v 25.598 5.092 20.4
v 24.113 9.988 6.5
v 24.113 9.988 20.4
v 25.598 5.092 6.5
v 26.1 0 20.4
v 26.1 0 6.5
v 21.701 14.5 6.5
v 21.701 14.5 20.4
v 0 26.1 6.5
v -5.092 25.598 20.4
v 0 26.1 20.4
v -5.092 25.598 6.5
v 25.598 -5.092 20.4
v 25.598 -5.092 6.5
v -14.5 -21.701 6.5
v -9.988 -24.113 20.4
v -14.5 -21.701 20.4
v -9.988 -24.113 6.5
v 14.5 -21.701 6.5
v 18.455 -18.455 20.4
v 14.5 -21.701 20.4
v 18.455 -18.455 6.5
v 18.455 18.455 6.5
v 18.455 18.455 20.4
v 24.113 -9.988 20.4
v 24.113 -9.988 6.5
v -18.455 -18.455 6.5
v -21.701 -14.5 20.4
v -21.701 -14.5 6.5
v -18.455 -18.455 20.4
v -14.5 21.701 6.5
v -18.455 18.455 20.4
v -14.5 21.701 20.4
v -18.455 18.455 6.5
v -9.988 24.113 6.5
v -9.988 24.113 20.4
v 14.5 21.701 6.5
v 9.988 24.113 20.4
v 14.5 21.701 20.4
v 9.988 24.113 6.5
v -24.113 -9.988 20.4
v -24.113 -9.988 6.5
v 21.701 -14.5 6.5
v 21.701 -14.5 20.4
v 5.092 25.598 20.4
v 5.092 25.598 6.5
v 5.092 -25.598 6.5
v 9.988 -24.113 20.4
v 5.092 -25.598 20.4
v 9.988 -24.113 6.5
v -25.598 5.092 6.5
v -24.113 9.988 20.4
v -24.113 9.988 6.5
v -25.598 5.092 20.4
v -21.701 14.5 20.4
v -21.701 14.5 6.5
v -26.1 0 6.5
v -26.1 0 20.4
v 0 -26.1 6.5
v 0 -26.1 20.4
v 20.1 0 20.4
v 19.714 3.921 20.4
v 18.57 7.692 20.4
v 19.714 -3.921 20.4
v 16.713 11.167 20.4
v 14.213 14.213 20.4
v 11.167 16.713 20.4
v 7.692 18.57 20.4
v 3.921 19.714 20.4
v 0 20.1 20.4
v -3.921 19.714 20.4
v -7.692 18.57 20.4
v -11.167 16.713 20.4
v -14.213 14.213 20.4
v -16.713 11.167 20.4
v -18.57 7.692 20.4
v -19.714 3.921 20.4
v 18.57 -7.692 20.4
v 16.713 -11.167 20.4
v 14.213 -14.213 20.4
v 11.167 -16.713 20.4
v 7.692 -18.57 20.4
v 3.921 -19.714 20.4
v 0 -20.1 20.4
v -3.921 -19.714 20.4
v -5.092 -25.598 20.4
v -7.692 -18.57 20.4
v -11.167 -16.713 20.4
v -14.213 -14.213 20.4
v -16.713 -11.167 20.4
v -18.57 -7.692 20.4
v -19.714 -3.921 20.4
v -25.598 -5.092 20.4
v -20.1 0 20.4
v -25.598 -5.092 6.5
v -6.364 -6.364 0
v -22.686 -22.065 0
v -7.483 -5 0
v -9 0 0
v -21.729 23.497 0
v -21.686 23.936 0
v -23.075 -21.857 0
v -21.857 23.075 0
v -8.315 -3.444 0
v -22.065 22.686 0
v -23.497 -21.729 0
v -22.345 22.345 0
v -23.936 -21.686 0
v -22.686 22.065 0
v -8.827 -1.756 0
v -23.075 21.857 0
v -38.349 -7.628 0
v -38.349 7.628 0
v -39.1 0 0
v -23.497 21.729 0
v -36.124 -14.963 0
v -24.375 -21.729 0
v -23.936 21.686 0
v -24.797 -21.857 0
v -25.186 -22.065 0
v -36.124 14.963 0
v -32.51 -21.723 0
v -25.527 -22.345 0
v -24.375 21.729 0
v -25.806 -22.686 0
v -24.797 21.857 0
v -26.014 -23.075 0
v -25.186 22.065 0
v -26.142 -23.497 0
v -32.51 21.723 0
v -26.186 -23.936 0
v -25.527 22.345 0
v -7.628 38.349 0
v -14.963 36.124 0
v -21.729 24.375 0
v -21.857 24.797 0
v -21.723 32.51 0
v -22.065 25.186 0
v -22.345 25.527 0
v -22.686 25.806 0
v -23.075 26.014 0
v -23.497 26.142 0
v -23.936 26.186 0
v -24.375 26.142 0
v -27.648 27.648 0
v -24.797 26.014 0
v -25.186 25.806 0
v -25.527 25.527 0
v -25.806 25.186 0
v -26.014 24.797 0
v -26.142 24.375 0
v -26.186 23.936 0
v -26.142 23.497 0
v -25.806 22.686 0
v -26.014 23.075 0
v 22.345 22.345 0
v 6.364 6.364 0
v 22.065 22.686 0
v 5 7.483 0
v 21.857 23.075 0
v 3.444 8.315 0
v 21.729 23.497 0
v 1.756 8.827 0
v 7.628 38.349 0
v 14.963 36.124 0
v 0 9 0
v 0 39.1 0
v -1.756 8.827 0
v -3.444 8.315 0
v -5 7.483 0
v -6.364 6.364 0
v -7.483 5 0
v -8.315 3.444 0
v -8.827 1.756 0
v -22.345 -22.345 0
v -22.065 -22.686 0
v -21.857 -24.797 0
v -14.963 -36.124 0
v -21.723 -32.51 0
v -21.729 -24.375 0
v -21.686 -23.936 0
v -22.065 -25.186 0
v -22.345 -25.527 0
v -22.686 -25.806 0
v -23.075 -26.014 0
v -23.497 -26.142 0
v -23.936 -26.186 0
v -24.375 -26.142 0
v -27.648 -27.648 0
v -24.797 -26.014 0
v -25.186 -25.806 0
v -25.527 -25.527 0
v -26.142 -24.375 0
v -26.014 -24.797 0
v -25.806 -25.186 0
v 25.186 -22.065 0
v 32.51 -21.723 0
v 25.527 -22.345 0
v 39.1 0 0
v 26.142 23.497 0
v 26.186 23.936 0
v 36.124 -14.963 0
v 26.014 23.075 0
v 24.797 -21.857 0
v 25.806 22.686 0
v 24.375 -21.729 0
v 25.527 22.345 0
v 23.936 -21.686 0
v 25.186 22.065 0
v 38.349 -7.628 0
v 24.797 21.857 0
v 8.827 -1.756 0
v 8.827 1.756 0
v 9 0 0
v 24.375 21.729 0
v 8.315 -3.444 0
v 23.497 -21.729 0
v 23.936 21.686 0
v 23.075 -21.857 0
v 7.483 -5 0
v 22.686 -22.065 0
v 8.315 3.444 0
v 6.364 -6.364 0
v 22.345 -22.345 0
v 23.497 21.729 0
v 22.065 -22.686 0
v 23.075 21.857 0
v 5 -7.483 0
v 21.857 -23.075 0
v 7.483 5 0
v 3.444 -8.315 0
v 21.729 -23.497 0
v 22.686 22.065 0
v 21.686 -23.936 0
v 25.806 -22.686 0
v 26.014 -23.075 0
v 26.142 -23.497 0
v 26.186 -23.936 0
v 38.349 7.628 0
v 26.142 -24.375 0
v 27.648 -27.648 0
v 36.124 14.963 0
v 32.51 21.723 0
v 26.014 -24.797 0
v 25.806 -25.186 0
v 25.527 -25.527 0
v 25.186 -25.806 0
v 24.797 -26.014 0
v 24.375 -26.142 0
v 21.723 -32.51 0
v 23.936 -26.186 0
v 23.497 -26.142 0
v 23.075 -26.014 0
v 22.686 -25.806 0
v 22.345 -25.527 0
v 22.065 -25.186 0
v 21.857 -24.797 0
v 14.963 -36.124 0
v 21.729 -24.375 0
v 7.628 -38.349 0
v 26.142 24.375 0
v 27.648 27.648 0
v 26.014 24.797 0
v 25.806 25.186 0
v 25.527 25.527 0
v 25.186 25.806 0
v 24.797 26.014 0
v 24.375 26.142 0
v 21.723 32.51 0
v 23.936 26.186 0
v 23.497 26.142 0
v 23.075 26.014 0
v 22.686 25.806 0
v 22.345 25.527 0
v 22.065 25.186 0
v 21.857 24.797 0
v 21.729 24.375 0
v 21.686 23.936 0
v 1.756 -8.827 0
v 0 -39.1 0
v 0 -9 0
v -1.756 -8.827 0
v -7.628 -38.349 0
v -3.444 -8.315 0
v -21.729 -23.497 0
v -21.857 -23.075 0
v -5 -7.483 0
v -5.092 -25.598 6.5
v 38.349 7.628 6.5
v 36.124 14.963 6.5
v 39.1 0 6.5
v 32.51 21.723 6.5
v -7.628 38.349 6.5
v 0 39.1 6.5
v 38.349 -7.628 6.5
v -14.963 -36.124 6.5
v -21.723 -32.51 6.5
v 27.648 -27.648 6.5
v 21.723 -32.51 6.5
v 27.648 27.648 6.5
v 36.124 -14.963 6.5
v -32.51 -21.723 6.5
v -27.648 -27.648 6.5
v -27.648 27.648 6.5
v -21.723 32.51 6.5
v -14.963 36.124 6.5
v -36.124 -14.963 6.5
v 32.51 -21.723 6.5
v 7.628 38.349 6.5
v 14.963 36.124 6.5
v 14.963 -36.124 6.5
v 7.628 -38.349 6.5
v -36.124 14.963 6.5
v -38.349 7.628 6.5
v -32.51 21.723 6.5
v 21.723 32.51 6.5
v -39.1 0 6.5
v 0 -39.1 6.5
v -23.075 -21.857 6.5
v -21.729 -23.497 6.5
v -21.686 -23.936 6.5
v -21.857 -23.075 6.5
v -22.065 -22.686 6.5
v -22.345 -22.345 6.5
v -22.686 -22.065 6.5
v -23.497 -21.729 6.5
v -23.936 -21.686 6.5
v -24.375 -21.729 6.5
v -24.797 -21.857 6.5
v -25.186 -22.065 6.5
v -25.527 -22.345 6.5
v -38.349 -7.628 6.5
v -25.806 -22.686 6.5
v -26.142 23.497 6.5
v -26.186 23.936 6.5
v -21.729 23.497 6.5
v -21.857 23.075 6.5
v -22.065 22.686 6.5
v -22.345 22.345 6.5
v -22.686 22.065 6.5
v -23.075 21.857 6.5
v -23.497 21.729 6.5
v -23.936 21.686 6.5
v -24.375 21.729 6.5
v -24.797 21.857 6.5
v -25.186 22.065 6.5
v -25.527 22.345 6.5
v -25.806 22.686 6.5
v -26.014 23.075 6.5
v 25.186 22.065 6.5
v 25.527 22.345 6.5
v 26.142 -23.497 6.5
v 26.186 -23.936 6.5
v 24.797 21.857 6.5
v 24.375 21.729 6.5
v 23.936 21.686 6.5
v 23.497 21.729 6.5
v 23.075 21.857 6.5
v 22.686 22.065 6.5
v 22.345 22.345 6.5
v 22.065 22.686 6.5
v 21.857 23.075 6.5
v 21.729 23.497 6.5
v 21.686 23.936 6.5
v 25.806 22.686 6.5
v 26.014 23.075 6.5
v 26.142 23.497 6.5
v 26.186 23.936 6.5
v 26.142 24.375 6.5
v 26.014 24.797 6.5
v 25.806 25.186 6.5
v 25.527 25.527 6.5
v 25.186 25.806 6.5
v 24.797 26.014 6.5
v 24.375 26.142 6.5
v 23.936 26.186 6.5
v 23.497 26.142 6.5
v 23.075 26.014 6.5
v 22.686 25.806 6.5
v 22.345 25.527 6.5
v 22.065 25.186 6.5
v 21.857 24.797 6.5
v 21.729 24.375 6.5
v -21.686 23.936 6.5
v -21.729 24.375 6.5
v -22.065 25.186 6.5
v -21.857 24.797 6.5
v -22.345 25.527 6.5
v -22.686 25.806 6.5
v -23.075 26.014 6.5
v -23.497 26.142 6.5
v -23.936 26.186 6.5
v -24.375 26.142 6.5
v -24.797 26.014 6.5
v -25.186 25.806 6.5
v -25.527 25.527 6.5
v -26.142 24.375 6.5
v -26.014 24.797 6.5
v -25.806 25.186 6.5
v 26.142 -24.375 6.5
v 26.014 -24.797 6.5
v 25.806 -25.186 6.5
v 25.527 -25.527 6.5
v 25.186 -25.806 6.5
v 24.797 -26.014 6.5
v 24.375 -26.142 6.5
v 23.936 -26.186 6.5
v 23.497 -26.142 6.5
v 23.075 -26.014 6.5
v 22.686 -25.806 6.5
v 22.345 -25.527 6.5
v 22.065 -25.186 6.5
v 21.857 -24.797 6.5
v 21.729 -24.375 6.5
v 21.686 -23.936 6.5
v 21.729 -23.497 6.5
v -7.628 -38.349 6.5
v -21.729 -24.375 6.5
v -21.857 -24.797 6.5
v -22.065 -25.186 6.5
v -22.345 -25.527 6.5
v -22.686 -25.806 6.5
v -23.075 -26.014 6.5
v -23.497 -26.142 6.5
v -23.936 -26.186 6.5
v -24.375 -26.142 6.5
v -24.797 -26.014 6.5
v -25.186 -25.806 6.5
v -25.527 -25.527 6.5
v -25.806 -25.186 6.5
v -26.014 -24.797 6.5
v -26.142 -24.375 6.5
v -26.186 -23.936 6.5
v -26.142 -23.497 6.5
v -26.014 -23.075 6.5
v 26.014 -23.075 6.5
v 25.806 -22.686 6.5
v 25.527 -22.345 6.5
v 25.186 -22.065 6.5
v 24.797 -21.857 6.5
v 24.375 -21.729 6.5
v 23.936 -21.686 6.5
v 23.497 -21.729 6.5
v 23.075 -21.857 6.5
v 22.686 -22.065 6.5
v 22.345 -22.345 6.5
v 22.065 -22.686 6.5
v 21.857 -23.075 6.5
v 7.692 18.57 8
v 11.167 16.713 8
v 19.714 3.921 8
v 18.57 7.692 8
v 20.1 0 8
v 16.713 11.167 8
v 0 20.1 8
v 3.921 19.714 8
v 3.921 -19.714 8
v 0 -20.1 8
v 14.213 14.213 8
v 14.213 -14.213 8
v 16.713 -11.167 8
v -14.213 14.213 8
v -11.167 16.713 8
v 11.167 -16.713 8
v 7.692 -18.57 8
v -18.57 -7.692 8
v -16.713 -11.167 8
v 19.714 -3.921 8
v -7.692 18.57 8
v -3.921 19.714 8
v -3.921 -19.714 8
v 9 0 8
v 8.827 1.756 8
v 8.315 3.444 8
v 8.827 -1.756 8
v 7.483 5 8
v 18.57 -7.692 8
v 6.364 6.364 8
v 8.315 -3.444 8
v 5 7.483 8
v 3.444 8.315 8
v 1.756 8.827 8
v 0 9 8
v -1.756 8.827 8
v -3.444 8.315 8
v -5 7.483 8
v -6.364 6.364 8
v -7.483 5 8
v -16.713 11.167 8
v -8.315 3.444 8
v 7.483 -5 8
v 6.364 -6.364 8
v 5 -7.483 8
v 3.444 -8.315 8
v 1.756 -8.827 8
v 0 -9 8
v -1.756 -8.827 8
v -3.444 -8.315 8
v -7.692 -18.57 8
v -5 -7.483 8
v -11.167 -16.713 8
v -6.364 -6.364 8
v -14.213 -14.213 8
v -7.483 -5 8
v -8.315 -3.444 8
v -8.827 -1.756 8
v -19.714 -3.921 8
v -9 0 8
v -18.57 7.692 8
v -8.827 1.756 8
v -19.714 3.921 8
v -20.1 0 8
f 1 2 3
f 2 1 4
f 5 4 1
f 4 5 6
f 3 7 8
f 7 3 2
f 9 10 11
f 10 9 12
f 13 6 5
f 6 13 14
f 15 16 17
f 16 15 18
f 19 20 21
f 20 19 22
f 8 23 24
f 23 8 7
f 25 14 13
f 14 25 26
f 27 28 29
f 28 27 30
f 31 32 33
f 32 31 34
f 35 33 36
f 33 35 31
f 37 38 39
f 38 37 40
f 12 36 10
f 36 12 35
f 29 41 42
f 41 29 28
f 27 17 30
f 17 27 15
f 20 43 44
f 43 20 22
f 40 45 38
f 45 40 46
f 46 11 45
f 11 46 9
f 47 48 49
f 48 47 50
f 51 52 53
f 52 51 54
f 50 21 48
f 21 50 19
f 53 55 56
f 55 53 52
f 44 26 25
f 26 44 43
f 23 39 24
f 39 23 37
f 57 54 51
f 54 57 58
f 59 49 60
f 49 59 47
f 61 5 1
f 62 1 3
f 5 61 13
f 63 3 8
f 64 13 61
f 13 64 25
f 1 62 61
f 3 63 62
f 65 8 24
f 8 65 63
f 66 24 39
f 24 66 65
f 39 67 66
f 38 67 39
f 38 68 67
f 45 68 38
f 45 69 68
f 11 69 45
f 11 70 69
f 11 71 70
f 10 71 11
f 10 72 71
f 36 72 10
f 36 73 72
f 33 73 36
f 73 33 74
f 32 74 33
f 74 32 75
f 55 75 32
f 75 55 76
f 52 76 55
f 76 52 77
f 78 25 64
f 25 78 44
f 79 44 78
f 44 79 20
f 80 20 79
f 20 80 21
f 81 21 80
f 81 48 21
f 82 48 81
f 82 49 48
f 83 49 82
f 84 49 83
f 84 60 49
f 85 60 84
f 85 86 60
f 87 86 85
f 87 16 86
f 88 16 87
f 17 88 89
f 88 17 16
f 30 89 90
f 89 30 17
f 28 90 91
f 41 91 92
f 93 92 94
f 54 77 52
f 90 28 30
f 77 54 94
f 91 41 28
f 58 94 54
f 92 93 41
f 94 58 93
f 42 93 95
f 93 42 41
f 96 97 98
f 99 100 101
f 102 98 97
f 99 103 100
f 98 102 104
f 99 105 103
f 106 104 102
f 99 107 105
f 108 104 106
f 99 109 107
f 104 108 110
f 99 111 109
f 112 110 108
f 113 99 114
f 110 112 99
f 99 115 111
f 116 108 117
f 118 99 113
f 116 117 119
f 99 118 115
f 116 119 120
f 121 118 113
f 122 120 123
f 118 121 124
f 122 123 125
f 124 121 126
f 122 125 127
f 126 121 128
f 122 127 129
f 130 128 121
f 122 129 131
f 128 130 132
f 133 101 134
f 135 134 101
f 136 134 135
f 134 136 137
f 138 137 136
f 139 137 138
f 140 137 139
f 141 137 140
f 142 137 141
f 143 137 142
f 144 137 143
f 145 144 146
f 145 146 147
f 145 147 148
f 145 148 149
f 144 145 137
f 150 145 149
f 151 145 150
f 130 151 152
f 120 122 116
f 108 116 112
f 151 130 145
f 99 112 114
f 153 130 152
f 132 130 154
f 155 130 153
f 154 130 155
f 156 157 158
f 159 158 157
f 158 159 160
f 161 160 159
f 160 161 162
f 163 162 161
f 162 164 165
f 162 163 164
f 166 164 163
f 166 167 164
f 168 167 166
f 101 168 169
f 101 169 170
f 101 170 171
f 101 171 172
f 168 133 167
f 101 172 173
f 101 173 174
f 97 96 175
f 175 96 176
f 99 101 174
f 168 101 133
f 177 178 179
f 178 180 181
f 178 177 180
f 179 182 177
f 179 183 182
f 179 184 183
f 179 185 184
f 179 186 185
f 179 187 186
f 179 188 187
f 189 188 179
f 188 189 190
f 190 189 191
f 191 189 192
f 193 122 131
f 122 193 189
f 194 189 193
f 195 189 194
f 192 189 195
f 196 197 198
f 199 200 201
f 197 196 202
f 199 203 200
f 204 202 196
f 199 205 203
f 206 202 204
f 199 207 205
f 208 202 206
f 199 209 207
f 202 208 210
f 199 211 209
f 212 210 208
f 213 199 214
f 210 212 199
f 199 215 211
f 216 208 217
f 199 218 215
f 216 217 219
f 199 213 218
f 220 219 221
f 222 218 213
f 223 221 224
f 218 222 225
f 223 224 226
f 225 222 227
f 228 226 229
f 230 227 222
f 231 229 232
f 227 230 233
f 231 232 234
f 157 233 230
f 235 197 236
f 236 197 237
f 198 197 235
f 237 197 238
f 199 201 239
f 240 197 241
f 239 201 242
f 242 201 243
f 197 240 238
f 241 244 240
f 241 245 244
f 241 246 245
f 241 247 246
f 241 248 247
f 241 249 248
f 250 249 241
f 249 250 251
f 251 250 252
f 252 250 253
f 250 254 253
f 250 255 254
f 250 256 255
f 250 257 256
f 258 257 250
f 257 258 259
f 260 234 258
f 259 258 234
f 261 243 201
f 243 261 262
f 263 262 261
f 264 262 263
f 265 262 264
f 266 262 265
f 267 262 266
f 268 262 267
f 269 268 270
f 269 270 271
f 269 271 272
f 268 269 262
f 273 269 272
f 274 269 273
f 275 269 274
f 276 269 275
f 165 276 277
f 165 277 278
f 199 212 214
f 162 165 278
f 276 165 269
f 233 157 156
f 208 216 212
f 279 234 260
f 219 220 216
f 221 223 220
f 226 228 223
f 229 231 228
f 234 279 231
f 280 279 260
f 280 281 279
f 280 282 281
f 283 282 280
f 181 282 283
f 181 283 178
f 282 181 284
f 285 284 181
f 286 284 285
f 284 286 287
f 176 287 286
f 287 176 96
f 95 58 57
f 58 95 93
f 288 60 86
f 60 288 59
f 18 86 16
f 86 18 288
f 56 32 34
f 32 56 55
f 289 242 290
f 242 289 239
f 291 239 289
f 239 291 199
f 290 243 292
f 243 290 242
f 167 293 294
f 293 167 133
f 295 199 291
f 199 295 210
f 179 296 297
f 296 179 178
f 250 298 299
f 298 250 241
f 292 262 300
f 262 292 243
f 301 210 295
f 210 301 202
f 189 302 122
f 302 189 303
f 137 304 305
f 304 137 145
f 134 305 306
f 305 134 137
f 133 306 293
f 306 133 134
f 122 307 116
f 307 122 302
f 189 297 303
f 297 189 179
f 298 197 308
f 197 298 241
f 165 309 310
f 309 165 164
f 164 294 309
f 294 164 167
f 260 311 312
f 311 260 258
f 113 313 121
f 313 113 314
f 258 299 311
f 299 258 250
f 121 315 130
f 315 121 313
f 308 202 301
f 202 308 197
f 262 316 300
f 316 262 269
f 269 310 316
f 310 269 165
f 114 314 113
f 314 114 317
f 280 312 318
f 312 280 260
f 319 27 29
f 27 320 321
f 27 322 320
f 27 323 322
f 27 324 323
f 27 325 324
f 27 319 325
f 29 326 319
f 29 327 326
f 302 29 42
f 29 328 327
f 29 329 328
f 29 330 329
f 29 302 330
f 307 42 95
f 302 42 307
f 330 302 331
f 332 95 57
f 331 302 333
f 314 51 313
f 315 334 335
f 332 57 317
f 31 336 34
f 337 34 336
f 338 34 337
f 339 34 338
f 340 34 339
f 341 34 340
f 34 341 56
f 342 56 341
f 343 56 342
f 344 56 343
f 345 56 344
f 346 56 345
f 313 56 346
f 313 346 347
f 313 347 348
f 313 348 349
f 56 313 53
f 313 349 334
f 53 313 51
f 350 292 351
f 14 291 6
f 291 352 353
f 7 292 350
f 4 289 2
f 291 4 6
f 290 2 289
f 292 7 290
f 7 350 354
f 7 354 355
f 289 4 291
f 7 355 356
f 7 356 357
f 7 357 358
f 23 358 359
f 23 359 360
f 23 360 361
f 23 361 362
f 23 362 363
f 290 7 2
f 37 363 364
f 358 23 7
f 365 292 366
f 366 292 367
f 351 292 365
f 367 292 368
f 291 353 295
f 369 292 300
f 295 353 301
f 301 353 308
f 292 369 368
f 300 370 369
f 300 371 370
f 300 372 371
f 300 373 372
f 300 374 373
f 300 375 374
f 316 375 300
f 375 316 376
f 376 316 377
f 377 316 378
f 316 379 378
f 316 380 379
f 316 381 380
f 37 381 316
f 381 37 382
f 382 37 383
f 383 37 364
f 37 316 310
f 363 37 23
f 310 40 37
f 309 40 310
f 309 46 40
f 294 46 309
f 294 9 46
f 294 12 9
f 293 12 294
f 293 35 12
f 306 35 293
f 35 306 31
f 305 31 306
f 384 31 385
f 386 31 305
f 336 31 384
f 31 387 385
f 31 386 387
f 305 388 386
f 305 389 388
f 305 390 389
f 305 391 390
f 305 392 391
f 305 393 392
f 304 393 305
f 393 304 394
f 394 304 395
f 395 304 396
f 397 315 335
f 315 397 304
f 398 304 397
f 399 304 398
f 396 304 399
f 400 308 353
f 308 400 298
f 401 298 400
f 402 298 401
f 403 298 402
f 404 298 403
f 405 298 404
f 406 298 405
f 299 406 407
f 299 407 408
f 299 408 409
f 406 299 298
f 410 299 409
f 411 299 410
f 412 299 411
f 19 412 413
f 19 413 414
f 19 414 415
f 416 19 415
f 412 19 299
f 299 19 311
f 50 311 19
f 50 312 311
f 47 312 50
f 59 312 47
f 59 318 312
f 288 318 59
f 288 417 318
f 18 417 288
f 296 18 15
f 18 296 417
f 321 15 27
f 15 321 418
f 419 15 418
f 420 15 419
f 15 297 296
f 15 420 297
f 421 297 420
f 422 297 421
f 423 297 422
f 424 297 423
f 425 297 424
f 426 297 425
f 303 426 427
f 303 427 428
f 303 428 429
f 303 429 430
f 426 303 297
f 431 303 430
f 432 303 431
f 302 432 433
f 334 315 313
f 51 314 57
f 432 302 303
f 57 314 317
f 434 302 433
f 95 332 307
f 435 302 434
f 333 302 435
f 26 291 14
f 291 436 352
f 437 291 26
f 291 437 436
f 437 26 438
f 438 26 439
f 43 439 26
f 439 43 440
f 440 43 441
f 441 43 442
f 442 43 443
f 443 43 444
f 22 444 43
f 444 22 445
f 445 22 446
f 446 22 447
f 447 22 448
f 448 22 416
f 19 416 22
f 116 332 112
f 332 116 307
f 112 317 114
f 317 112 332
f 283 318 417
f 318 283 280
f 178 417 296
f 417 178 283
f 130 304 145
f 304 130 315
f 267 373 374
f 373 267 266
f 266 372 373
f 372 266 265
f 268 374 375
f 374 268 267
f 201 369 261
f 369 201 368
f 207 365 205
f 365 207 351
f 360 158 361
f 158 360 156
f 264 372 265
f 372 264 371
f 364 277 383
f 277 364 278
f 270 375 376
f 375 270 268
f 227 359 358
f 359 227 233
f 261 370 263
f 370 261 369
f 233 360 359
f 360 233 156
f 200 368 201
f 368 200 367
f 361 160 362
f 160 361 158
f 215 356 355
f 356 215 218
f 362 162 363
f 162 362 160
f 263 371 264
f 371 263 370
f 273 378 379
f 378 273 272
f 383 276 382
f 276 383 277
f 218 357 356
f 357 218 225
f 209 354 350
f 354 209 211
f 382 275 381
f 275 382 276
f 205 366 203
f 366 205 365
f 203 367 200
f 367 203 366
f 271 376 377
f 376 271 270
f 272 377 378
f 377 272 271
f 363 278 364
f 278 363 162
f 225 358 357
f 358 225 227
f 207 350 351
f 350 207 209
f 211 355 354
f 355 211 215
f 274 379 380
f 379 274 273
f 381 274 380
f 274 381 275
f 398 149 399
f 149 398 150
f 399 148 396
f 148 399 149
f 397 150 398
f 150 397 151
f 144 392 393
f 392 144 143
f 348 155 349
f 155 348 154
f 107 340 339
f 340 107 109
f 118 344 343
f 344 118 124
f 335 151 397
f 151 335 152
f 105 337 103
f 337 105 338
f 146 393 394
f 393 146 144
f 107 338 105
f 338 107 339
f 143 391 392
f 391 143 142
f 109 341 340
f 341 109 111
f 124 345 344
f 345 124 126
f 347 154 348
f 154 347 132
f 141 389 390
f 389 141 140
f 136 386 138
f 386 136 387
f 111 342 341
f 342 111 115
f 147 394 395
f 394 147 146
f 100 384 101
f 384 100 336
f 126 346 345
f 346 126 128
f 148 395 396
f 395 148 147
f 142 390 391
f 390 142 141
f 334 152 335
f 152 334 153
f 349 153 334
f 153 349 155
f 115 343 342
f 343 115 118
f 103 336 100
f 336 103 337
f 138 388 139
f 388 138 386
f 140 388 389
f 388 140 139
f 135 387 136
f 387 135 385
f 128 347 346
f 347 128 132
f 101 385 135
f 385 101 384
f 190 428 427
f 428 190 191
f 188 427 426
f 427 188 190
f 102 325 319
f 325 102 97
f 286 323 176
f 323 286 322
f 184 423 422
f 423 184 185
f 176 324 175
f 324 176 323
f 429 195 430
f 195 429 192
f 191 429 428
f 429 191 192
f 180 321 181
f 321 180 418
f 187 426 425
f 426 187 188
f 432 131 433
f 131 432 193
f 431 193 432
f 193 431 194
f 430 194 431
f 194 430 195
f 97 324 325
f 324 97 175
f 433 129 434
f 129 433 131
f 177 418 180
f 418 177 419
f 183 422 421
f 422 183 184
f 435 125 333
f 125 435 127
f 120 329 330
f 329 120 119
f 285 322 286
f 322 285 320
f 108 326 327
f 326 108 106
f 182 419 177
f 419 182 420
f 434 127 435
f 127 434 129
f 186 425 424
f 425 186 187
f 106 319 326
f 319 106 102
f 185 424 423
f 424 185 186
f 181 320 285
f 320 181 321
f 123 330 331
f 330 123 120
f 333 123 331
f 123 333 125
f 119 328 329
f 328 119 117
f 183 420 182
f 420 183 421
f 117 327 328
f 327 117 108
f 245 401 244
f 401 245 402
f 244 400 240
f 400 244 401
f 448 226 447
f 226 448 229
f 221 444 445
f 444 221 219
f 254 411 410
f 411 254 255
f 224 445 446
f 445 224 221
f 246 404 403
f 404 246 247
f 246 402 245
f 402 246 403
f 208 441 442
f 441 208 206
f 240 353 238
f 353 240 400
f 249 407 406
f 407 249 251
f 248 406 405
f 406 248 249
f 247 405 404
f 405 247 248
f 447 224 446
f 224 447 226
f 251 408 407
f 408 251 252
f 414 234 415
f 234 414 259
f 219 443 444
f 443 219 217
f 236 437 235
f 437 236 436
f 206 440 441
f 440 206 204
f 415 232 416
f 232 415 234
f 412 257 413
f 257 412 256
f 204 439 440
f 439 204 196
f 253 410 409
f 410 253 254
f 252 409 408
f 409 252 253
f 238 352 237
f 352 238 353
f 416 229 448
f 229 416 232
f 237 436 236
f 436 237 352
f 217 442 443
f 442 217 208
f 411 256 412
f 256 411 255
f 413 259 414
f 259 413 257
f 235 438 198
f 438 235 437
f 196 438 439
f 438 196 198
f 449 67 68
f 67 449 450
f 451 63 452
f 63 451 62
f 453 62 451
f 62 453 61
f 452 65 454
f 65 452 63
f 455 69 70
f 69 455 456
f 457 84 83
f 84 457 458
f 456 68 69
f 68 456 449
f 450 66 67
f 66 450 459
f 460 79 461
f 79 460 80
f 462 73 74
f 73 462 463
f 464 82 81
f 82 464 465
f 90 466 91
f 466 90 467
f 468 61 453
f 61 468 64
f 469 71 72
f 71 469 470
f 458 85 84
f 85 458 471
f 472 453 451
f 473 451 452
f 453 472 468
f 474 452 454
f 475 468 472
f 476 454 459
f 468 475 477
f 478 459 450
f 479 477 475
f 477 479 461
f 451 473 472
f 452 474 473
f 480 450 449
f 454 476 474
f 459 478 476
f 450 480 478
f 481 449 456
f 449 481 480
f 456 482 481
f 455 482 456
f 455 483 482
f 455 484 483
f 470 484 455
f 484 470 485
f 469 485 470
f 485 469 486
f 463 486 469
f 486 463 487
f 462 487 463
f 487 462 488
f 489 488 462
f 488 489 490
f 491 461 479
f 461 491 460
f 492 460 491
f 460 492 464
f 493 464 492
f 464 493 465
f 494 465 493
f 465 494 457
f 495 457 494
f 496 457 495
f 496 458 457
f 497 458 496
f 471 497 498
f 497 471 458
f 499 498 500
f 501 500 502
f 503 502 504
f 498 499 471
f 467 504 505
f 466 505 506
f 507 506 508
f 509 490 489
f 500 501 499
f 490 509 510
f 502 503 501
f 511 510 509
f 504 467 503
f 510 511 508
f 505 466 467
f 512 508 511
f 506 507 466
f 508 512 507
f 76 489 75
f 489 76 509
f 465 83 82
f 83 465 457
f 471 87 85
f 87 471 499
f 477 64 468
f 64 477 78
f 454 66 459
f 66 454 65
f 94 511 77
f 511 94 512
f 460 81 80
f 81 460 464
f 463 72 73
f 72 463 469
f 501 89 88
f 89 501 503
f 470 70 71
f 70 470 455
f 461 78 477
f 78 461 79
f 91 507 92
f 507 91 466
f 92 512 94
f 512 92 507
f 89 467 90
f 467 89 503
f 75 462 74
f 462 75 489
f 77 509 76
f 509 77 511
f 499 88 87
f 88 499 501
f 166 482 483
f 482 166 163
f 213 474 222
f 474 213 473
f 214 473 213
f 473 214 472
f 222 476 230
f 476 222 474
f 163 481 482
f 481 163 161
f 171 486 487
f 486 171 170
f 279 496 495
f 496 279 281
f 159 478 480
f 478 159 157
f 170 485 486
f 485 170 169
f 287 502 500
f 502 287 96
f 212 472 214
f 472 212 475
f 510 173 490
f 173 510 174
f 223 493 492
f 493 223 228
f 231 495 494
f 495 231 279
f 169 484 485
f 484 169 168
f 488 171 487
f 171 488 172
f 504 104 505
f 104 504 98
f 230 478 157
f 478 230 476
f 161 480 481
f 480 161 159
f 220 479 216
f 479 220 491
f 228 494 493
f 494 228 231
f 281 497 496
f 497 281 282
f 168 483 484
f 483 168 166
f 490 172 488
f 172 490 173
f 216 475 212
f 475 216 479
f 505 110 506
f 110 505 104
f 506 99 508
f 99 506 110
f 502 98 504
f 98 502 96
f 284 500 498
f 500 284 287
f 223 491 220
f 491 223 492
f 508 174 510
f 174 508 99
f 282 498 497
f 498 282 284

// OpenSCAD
$fn = 32;

// ----------------------------------------------------------------------
// Bearing housing: seat for 6203 (40 x 12 mm), 52.2 mm body
// ----------------------------------------------------------------------

// --- parameters (mm) ---
housing_d = 52.2;         // housing outside diameter
housing_h = 20.4;         // overall housing height
wall_t = 6;               // wall thickness
seat_d = 40.2;            // 6203 seat, 0.2 mm clearance
seat_h = 12.4;            // pocket depth
shoulder = 3;             // shoulder under the bearing
pass_d = 18;              // shaft passage
flange_d = 78.2;          // mounting flange diameter
flange_t = 5;             // flange thickness
bolt_d = 4.5;             // flange bolt clearance
bolt_r = 33.85;           // flange bolt circle radius

module body() {
  cylinder(h = housing_h, d = housing_d);
}

module flange() {
  /* flange sunk 1.5 mm into the body */
  cylinder(h = flange_t + 1.5, d = flange_d);
}

difference() {
  union() {
    body();
    flange();
  }
  translate([0, 0, housing_h - seat_h]) cylinder(h = seat_h + 1, d = seat_d);
  translate([0, 0, -1]) cylinder(h = housing_h - seat_h + 1, d = pass_d);
  for (i = [0 : 3]) rotate([0, 0, 45 + i * 90]) translate([bolt_r, 0, -1])
    cylinder(h = flange_t + 3, d = bolt_d);
}
